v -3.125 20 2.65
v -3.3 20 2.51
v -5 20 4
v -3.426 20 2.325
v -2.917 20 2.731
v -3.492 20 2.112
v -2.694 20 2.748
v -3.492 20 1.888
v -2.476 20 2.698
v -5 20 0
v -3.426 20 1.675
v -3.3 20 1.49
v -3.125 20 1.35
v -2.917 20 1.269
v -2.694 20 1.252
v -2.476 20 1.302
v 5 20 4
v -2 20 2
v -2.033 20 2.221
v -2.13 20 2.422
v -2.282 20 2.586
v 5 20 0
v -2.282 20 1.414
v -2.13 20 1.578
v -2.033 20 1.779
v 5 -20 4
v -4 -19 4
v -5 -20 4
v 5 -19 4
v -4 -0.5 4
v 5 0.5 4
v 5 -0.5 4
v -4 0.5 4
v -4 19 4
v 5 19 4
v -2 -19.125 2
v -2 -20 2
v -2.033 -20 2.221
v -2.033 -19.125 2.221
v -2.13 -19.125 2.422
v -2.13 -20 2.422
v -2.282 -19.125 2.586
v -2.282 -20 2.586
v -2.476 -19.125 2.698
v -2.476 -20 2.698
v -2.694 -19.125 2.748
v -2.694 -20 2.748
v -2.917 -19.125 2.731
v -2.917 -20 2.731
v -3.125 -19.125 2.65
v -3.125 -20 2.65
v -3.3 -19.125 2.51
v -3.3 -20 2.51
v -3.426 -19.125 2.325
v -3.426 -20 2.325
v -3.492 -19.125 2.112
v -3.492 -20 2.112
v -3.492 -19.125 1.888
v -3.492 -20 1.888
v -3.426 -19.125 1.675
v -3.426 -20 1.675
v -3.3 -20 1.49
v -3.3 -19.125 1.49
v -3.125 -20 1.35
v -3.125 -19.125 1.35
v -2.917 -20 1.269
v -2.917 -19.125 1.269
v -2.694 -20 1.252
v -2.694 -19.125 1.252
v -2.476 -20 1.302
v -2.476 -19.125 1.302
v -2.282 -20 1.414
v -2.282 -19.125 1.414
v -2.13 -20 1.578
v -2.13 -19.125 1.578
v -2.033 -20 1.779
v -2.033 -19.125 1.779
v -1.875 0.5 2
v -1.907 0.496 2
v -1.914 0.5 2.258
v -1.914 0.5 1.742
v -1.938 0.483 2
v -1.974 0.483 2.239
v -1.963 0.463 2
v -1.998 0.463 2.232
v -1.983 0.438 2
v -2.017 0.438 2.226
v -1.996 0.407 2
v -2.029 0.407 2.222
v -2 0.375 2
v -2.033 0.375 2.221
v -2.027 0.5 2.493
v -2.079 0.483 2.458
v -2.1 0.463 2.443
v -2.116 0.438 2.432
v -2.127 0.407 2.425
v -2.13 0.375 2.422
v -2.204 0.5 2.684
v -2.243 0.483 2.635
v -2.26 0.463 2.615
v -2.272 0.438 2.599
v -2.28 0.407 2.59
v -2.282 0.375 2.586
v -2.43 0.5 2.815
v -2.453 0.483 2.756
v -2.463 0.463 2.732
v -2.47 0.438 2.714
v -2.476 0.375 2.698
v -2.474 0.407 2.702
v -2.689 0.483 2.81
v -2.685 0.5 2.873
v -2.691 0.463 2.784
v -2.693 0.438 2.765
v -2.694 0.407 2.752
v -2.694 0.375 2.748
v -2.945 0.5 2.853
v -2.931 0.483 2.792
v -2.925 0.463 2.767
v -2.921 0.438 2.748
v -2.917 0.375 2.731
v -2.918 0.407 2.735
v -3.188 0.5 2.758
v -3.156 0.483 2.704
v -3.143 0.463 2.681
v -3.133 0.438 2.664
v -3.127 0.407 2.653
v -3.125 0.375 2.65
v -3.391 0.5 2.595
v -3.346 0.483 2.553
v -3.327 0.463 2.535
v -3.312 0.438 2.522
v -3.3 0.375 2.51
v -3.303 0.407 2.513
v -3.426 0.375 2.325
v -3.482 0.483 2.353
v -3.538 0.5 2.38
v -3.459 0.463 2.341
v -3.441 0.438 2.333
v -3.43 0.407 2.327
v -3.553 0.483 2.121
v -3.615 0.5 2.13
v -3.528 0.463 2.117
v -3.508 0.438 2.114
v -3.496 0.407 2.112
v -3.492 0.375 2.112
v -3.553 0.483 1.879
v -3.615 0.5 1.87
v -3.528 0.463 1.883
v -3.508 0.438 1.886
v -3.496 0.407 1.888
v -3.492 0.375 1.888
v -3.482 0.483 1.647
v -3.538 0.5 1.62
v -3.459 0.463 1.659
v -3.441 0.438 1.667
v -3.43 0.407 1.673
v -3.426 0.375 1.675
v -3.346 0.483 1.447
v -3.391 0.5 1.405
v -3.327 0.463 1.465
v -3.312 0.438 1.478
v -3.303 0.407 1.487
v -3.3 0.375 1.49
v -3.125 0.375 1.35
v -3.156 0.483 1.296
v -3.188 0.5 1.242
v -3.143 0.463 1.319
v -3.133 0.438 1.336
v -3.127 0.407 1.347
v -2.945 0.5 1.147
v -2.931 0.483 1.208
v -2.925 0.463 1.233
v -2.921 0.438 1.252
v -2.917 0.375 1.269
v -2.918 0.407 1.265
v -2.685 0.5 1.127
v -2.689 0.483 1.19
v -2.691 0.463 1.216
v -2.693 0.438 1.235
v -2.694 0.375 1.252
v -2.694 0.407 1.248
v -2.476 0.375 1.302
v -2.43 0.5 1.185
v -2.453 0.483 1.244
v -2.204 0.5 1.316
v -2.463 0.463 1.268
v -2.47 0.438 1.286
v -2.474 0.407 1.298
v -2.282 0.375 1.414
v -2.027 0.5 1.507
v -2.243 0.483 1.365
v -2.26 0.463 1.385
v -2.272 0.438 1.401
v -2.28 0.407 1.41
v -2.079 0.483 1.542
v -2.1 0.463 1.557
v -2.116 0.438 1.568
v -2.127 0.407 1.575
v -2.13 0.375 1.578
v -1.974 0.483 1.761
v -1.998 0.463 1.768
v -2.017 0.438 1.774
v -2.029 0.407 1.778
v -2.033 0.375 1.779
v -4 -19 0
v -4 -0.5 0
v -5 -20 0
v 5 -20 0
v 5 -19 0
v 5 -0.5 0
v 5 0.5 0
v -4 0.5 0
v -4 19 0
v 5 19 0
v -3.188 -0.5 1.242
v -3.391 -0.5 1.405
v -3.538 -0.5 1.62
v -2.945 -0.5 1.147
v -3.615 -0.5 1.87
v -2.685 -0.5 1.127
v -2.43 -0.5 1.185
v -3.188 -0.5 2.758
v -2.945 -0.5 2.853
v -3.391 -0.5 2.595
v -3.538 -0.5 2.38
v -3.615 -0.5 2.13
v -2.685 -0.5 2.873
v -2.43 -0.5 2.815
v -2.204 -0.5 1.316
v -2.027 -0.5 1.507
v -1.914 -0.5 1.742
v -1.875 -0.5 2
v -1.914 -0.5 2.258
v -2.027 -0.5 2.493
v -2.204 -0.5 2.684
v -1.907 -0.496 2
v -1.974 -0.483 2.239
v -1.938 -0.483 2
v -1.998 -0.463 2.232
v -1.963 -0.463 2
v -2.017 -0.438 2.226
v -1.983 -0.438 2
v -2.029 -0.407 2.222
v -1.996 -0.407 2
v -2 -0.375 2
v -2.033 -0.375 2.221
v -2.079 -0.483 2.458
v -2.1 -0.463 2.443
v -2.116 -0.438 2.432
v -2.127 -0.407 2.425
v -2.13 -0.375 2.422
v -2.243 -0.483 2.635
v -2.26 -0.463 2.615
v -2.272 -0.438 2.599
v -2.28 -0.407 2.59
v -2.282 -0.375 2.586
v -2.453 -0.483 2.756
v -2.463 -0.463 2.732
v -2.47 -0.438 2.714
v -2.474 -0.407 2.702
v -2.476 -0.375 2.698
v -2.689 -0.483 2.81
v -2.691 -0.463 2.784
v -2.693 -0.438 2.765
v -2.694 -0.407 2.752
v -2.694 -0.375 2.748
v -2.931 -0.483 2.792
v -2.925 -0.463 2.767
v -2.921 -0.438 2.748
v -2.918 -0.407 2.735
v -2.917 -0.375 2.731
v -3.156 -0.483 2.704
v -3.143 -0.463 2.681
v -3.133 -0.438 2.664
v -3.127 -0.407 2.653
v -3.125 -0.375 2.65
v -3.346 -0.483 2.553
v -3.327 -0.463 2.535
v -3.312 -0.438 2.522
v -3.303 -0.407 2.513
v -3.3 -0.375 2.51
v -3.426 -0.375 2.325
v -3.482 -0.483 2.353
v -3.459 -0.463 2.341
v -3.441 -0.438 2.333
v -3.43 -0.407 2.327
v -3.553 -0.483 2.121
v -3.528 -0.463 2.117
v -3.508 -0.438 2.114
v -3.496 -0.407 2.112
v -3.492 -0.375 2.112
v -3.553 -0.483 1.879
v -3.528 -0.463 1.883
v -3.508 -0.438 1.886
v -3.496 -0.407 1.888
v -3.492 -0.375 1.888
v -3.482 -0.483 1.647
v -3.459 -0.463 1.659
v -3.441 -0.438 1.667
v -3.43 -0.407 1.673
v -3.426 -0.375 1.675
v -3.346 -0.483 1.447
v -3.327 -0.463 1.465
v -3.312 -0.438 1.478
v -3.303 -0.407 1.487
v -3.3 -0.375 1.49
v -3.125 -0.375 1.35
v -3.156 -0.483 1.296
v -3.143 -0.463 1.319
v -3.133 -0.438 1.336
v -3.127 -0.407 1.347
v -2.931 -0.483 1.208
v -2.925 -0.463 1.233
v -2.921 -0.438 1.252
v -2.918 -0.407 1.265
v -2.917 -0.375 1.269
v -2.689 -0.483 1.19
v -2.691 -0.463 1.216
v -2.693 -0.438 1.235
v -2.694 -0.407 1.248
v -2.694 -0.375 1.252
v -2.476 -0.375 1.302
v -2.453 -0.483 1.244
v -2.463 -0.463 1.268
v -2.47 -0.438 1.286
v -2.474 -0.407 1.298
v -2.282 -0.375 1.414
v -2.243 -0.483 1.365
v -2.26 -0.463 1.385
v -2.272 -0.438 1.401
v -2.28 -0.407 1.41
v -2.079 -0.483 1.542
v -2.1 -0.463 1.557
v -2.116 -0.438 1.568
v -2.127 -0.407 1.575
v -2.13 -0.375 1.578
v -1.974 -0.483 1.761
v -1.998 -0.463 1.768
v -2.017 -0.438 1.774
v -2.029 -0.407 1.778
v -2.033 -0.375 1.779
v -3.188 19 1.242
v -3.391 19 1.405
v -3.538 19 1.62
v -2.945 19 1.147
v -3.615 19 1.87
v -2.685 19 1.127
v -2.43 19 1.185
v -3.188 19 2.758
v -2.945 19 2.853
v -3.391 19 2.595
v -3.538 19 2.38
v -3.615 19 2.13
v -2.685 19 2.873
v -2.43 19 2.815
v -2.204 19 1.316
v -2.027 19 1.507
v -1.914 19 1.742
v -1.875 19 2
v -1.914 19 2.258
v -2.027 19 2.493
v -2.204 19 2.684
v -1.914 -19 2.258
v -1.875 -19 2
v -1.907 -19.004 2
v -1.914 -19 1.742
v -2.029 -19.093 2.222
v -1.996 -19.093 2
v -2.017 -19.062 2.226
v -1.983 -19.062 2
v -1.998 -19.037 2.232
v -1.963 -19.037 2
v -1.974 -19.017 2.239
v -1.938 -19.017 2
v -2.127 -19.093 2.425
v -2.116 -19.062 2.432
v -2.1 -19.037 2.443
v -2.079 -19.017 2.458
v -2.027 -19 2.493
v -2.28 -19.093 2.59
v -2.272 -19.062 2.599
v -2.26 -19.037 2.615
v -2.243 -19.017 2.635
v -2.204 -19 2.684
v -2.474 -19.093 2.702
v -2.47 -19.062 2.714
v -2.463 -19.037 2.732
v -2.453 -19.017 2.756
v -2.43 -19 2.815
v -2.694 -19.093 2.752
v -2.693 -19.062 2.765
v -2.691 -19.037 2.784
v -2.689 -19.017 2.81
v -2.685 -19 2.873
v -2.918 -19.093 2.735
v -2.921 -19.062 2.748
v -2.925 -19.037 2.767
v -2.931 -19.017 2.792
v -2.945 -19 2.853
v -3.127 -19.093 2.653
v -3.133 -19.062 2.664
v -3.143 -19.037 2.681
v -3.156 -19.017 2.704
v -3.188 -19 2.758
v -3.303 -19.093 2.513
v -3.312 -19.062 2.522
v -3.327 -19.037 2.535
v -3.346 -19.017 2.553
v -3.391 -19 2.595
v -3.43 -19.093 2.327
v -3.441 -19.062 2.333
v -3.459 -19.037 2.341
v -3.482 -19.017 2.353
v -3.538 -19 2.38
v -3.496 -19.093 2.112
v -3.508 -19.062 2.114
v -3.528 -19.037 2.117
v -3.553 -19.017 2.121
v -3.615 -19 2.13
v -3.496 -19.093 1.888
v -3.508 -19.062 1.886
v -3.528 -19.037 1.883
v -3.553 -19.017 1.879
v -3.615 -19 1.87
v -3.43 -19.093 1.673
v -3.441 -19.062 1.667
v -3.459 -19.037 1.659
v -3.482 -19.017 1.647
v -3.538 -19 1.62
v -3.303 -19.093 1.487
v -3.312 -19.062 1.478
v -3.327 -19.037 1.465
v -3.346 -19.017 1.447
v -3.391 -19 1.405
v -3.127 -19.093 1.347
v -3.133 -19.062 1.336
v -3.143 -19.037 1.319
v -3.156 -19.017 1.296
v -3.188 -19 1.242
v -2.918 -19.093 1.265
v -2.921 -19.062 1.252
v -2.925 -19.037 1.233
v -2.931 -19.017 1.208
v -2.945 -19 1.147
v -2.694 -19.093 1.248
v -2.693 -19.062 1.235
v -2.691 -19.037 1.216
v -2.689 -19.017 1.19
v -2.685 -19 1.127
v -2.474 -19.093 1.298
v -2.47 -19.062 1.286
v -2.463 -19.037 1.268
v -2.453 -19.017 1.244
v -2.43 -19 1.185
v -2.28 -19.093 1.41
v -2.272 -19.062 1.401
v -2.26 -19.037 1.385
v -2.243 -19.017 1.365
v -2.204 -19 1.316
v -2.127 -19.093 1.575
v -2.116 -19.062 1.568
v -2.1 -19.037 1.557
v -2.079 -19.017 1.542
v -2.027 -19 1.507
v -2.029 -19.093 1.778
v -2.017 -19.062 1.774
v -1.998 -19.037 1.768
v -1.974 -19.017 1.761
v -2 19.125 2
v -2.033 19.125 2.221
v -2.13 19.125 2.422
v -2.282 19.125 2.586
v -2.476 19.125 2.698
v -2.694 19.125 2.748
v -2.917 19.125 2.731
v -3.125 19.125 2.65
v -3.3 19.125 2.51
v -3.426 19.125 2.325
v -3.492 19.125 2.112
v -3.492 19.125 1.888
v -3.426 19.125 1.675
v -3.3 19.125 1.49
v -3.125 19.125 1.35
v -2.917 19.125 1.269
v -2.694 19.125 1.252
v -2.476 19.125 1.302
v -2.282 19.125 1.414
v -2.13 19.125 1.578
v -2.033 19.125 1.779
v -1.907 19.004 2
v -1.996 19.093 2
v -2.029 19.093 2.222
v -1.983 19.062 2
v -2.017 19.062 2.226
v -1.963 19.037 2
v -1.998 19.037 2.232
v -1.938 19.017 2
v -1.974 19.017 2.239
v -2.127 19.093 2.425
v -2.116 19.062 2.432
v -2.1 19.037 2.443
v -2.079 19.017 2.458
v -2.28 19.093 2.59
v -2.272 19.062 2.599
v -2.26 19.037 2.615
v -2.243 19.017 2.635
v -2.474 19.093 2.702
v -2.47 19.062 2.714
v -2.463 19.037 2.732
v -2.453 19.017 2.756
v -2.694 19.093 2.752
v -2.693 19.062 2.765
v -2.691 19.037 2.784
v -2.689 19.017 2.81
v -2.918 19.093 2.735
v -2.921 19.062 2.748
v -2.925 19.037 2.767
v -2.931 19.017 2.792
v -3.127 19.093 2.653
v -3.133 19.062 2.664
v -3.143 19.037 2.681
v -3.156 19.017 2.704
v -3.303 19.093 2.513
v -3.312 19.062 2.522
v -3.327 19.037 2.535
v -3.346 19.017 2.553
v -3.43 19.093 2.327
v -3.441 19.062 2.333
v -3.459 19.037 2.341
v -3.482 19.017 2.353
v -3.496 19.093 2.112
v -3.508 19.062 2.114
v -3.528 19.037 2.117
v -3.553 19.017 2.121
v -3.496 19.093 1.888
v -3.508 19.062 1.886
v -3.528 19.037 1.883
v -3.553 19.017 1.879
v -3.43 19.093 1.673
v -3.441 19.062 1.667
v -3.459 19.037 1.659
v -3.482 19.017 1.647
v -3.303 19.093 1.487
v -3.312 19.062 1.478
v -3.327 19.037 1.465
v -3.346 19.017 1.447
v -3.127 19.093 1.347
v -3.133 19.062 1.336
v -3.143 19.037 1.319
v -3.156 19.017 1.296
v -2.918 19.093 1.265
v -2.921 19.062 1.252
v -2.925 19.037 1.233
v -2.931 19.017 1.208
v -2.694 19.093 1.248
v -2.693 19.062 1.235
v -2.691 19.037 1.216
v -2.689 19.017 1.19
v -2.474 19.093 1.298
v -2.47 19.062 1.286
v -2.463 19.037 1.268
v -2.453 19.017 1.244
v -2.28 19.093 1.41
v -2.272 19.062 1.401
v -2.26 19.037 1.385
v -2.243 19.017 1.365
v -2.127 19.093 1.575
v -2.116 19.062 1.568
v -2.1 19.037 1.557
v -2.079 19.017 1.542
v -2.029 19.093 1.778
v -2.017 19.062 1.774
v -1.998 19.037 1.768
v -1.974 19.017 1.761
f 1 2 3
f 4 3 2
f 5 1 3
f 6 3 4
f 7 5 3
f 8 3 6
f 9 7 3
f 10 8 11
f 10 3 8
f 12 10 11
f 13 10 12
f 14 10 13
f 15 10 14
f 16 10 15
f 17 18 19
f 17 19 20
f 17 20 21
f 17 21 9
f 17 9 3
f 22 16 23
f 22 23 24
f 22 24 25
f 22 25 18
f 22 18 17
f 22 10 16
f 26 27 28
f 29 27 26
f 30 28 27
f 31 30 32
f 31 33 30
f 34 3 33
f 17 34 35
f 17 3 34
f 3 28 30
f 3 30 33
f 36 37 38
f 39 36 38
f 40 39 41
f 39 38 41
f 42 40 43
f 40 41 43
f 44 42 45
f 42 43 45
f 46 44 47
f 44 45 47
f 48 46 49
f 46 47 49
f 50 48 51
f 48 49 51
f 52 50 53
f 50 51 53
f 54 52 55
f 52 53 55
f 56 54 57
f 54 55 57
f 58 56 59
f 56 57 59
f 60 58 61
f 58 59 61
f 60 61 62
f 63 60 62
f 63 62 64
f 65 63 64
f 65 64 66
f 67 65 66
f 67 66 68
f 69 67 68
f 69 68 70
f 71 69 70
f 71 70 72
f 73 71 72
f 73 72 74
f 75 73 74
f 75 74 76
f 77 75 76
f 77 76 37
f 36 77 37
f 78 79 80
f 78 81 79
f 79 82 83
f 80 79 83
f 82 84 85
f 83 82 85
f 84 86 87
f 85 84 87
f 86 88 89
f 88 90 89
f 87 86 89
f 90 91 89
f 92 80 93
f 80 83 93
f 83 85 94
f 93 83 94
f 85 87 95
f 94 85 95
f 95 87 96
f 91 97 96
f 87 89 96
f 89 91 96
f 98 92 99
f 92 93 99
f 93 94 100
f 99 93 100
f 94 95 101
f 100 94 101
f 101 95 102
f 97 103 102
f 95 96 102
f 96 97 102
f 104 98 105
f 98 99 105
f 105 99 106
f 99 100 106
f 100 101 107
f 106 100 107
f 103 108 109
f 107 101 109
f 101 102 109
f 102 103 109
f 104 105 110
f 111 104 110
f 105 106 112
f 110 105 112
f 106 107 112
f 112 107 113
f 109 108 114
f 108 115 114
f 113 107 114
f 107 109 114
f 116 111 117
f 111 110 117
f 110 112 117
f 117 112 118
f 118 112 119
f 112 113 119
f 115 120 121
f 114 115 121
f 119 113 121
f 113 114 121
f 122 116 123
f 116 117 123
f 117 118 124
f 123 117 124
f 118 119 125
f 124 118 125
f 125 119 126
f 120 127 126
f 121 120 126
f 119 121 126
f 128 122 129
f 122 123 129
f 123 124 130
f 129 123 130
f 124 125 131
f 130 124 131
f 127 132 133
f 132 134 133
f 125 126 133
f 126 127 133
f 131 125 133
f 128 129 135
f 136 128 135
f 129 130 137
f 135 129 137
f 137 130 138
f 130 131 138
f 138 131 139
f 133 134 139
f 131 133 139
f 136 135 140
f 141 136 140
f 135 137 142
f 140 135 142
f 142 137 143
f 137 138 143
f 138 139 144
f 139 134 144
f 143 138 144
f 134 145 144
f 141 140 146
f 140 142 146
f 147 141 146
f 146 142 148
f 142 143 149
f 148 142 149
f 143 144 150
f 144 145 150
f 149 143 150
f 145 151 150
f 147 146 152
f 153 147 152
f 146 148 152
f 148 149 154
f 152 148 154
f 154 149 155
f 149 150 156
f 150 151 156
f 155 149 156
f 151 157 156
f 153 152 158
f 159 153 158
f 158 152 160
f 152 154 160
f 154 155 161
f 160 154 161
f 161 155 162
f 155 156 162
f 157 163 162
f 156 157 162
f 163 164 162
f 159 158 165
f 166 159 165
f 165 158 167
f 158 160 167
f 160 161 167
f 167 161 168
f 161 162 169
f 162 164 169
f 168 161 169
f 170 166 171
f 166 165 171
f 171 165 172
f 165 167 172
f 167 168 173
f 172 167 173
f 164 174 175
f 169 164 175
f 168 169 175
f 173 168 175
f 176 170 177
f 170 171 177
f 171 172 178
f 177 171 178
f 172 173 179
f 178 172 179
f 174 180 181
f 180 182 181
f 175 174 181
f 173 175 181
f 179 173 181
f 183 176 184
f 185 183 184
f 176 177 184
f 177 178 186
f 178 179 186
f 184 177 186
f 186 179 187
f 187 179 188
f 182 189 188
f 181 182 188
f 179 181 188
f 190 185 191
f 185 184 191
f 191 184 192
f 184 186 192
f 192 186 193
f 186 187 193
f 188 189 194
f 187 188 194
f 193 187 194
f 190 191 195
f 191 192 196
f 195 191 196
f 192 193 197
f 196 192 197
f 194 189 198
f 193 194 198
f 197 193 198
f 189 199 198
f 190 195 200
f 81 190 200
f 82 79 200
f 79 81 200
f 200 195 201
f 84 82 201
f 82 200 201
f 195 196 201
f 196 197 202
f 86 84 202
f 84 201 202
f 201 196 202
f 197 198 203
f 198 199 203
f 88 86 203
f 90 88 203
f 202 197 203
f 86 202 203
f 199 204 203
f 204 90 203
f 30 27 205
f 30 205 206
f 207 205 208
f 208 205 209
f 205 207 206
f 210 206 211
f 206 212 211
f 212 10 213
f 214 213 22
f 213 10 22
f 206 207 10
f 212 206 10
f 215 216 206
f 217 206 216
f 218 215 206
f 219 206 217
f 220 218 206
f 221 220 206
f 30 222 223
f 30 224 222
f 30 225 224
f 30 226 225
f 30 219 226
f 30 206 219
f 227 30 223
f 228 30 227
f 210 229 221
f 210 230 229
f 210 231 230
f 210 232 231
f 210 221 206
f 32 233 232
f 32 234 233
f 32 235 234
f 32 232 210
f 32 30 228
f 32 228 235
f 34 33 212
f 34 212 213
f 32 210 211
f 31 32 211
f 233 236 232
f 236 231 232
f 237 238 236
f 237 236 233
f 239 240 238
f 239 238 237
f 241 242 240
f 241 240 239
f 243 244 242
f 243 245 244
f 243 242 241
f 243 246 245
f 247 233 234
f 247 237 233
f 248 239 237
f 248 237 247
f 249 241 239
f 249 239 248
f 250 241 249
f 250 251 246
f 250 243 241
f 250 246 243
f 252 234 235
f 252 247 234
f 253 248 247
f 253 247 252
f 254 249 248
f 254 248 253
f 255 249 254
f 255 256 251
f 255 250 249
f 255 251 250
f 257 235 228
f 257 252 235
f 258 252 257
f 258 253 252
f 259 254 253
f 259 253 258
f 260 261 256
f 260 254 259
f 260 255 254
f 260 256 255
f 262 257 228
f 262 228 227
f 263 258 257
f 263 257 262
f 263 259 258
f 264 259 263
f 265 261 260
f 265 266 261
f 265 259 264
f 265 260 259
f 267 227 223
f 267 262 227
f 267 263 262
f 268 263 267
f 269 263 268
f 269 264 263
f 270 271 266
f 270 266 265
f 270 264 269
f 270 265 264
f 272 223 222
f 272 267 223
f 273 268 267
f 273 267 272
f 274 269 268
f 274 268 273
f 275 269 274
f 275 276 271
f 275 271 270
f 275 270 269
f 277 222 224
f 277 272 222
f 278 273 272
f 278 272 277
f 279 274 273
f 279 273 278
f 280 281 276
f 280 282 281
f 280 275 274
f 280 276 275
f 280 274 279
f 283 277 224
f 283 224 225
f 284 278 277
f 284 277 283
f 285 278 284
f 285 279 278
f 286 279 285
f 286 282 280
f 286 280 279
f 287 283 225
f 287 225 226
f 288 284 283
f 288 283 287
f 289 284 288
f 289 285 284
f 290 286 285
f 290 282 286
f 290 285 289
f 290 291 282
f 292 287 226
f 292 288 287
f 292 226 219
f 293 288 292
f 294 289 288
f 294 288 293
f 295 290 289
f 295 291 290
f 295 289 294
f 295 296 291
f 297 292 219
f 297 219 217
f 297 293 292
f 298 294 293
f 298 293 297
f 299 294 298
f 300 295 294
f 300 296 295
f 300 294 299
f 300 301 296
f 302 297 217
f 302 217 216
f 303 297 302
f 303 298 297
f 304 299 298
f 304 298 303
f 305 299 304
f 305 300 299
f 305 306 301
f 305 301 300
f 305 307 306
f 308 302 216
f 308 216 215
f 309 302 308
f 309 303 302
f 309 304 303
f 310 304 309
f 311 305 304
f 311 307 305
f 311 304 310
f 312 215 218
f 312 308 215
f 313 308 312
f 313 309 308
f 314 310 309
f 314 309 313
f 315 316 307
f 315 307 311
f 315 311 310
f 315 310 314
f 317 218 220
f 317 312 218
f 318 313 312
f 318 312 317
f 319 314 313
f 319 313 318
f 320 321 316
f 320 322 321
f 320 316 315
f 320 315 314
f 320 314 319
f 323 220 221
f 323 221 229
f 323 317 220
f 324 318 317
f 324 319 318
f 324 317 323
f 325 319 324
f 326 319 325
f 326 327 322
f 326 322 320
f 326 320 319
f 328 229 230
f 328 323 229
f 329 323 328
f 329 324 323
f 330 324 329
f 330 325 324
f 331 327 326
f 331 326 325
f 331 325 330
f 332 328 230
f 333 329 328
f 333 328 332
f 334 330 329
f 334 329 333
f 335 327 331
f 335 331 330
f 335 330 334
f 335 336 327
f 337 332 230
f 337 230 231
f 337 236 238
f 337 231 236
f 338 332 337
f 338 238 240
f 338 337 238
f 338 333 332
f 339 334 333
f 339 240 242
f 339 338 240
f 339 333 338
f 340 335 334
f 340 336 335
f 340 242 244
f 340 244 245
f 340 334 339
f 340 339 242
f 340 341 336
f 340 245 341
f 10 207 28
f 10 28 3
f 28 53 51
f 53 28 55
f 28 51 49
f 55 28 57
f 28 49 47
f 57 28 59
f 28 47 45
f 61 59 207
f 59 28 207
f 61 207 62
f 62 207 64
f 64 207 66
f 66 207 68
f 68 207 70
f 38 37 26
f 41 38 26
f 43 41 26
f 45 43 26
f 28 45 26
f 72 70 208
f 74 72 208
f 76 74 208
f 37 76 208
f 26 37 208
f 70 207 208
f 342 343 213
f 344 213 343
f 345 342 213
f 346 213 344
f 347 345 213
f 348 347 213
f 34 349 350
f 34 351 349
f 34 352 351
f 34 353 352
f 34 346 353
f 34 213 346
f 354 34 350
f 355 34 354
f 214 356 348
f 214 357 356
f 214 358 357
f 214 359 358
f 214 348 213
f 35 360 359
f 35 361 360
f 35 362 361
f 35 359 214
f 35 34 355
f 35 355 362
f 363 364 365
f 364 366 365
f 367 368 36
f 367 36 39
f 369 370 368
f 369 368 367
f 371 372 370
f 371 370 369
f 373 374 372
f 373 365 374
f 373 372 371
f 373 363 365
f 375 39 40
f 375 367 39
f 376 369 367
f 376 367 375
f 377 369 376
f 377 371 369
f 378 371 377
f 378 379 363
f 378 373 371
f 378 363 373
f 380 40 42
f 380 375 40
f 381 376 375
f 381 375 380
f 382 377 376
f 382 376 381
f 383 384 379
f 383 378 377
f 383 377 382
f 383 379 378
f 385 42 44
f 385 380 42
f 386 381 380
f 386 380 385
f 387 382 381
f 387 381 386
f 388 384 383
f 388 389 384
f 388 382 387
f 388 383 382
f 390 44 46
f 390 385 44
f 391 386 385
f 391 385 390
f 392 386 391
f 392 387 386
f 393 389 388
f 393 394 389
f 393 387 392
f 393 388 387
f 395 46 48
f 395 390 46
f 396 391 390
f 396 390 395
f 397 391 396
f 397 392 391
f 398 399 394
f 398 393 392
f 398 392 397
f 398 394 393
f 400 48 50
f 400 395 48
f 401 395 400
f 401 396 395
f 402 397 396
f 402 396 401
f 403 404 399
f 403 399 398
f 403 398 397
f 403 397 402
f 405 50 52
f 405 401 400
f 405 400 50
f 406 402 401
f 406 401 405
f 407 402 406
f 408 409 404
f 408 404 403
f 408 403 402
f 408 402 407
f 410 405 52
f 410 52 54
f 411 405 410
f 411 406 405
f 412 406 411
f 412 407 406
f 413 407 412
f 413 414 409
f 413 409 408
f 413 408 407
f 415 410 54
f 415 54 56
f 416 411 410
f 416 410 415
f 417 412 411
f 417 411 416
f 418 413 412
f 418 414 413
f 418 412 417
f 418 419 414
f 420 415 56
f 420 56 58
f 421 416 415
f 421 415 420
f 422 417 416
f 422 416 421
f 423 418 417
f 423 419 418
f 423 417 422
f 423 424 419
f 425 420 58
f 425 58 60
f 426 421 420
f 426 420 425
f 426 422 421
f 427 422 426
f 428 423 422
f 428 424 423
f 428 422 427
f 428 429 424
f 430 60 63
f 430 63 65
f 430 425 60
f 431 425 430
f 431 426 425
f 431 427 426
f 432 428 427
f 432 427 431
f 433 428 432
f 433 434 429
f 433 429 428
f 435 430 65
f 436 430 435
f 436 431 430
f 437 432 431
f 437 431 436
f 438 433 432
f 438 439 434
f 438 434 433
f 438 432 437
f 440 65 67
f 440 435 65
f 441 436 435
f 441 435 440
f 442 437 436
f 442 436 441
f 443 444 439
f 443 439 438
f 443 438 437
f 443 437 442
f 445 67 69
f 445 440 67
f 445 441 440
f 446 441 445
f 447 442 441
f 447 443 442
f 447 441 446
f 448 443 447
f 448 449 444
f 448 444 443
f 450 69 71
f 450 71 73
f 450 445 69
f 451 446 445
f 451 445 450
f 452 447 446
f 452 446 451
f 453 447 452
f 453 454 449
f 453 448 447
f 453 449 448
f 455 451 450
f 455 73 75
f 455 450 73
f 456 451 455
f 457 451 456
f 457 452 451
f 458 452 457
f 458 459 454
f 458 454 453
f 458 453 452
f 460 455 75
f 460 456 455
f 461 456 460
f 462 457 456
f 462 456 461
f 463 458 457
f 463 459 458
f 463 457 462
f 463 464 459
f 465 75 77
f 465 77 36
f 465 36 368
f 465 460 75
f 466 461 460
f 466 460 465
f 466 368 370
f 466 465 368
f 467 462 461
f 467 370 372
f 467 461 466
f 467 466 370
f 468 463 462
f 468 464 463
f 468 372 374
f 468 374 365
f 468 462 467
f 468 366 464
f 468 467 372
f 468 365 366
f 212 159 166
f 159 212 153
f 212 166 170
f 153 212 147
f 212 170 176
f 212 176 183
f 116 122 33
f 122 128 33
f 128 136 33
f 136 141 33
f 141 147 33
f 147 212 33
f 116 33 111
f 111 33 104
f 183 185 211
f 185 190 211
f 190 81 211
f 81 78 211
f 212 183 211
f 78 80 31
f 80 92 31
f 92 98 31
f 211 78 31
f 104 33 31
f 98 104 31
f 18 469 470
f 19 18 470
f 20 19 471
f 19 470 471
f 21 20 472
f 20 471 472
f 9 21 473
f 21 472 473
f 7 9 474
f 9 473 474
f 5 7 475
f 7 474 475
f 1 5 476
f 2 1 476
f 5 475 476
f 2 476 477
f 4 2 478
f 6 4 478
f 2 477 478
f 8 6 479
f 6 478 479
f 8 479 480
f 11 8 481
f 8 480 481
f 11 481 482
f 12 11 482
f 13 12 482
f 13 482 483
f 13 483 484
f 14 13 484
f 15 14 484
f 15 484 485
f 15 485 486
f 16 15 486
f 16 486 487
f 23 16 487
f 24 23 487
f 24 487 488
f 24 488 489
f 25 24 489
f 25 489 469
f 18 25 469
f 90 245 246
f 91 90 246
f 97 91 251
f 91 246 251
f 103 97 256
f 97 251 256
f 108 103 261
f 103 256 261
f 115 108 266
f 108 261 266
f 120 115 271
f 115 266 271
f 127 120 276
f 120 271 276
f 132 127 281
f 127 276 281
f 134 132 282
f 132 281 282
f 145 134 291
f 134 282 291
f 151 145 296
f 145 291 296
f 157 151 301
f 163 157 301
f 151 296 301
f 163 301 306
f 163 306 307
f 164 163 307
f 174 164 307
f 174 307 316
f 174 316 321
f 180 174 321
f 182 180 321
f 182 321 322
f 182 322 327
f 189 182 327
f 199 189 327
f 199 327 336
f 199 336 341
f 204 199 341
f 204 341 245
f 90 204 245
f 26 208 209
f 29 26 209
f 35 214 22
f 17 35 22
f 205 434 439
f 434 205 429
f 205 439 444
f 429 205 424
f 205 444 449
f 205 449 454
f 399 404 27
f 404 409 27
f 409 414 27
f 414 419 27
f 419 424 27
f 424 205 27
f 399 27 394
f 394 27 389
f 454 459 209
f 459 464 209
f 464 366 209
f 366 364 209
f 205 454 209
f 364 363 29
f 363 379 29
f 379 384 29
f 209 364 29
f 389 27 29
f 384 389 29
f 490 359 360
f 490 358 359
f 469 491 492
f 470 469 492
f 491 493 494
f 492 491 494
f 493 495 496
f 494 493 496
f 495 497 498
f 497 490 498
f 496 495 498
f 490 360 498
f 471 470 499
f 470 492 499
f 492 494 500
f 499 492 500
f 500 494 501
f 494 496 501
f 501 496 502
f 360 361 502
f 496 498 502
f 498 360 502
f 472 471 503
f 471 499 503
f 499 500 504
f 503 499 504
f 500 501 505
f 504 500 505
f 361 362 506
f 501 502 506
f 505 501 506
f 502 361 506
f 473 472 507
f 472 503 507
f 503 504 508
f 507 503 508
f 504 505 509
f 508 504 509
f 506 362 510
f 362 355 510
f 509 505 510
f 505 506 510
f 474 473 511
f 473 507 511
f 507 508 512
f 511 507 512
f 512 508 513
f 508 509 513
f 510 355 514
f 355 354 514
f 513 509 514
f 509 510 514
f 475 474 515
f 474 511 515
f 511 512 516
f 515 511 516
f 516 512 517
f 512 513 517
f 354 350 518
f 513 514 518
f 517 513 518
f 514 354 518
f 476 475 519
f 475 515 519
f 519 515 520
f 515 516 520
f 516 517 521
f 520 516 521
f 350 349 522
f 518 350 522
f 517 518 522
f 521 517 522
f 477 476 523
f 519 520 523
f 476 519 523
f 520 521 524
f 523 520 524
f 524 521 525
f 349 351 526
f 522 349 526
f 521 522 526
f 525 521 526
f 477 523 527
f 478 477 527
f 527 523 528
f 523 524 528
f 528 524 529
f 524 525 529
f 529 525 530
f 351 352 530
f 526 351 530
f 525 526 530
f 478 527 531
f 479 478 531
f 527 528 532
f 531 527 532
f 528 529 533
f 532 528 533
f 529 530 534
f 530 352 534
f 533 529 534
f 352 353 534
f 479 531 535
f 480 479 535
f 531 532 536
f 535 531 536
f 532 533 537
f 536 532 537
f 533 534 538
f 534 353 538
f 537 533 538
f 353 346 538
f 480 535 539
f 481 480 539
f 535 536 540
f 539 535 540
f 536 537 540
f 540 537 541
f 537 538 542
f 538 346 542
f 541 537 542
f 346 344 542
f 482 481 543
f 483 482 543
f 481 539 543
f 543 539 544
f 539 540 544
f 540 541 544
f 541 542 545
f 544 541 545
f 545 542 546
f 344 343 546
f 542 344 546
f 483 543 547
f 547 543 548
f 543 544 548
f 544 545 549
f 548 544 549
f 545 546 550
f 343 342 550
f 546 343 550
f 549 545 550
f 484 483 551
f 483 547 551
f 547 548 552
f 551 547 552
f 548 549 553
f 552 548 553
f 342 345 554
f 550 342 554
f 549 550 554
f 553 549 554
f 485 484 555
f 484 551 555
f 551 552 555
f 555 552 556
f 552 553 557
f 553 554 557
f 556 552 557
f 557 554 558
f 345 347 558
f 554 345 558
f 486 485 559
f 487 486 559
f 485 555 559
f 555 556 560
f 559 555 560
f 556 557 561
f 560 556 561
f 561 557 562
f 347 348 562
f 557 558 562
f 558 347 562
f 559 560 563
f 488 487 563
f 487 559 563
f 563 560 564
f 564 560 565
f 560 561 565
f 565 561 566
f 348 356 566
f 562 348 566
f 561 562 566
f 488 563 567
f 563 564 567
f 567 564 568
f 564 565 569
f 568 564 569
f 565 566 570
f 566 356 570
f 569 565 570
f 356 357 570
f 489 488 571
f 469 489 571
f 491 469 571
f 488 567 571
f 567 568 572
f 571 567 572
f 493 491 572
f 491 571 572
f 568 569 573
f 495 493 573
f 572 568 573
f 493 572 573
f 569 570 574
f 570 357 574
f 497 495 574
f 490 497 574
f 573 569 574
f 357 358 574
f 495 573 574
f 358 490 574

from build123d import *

# Parameters (mm, degrees)
F2_W     = 10
F2_H     = 40
F3_DEPTH = 4
F4_W     = 9
F4_H     = 18.5
F5_DEPTH = 4.001
F6_R     = 0.75
F7_DEPTH = 40.001
F8_R     = 0.125


with BuildPart() as f3:
    # F2 (on Top) → F3 (new body)
    with BuildSketch(Plane.XY):
        Rectangle(F2_W, F2_H)
    extrude(amount=F3_DEPTH)

    # F4 (on face) → F5 (cut, through all)
    with BuildSketch(Plane.XY.offset(4)):
        with Locations((0.5, 9.75)):
            Rectangle(F4_W, F4_H)
        with Locations((0.5, -9.75)):
            Rectangle(F4_W, F4_H)
    extrude(amount=-F5_DEPTH, mode=Mode.SUBTRACT)

    # F6 (on face) → F7 (cut, through all)
    with BuildSketch(Plane.XZ.offset(20)):
        with Locations((-2.75, 2)):
            Circle(F6_R)
    extrude(amount=-F7_DEPTH, mode=Mode.SUBTRACT)

    # F8
    f8_edges = [f3.edges().sort_by_distance(p)[0] for p in [
        (-3.5, -19, 2),
        (-3.5, -0.5, 2),
        (-3.5, 19, 2),
        (-3.5, 0.5, 2),
    ]]
    fillet(f8_edges, radius=F8_R)


solid = f3.part
